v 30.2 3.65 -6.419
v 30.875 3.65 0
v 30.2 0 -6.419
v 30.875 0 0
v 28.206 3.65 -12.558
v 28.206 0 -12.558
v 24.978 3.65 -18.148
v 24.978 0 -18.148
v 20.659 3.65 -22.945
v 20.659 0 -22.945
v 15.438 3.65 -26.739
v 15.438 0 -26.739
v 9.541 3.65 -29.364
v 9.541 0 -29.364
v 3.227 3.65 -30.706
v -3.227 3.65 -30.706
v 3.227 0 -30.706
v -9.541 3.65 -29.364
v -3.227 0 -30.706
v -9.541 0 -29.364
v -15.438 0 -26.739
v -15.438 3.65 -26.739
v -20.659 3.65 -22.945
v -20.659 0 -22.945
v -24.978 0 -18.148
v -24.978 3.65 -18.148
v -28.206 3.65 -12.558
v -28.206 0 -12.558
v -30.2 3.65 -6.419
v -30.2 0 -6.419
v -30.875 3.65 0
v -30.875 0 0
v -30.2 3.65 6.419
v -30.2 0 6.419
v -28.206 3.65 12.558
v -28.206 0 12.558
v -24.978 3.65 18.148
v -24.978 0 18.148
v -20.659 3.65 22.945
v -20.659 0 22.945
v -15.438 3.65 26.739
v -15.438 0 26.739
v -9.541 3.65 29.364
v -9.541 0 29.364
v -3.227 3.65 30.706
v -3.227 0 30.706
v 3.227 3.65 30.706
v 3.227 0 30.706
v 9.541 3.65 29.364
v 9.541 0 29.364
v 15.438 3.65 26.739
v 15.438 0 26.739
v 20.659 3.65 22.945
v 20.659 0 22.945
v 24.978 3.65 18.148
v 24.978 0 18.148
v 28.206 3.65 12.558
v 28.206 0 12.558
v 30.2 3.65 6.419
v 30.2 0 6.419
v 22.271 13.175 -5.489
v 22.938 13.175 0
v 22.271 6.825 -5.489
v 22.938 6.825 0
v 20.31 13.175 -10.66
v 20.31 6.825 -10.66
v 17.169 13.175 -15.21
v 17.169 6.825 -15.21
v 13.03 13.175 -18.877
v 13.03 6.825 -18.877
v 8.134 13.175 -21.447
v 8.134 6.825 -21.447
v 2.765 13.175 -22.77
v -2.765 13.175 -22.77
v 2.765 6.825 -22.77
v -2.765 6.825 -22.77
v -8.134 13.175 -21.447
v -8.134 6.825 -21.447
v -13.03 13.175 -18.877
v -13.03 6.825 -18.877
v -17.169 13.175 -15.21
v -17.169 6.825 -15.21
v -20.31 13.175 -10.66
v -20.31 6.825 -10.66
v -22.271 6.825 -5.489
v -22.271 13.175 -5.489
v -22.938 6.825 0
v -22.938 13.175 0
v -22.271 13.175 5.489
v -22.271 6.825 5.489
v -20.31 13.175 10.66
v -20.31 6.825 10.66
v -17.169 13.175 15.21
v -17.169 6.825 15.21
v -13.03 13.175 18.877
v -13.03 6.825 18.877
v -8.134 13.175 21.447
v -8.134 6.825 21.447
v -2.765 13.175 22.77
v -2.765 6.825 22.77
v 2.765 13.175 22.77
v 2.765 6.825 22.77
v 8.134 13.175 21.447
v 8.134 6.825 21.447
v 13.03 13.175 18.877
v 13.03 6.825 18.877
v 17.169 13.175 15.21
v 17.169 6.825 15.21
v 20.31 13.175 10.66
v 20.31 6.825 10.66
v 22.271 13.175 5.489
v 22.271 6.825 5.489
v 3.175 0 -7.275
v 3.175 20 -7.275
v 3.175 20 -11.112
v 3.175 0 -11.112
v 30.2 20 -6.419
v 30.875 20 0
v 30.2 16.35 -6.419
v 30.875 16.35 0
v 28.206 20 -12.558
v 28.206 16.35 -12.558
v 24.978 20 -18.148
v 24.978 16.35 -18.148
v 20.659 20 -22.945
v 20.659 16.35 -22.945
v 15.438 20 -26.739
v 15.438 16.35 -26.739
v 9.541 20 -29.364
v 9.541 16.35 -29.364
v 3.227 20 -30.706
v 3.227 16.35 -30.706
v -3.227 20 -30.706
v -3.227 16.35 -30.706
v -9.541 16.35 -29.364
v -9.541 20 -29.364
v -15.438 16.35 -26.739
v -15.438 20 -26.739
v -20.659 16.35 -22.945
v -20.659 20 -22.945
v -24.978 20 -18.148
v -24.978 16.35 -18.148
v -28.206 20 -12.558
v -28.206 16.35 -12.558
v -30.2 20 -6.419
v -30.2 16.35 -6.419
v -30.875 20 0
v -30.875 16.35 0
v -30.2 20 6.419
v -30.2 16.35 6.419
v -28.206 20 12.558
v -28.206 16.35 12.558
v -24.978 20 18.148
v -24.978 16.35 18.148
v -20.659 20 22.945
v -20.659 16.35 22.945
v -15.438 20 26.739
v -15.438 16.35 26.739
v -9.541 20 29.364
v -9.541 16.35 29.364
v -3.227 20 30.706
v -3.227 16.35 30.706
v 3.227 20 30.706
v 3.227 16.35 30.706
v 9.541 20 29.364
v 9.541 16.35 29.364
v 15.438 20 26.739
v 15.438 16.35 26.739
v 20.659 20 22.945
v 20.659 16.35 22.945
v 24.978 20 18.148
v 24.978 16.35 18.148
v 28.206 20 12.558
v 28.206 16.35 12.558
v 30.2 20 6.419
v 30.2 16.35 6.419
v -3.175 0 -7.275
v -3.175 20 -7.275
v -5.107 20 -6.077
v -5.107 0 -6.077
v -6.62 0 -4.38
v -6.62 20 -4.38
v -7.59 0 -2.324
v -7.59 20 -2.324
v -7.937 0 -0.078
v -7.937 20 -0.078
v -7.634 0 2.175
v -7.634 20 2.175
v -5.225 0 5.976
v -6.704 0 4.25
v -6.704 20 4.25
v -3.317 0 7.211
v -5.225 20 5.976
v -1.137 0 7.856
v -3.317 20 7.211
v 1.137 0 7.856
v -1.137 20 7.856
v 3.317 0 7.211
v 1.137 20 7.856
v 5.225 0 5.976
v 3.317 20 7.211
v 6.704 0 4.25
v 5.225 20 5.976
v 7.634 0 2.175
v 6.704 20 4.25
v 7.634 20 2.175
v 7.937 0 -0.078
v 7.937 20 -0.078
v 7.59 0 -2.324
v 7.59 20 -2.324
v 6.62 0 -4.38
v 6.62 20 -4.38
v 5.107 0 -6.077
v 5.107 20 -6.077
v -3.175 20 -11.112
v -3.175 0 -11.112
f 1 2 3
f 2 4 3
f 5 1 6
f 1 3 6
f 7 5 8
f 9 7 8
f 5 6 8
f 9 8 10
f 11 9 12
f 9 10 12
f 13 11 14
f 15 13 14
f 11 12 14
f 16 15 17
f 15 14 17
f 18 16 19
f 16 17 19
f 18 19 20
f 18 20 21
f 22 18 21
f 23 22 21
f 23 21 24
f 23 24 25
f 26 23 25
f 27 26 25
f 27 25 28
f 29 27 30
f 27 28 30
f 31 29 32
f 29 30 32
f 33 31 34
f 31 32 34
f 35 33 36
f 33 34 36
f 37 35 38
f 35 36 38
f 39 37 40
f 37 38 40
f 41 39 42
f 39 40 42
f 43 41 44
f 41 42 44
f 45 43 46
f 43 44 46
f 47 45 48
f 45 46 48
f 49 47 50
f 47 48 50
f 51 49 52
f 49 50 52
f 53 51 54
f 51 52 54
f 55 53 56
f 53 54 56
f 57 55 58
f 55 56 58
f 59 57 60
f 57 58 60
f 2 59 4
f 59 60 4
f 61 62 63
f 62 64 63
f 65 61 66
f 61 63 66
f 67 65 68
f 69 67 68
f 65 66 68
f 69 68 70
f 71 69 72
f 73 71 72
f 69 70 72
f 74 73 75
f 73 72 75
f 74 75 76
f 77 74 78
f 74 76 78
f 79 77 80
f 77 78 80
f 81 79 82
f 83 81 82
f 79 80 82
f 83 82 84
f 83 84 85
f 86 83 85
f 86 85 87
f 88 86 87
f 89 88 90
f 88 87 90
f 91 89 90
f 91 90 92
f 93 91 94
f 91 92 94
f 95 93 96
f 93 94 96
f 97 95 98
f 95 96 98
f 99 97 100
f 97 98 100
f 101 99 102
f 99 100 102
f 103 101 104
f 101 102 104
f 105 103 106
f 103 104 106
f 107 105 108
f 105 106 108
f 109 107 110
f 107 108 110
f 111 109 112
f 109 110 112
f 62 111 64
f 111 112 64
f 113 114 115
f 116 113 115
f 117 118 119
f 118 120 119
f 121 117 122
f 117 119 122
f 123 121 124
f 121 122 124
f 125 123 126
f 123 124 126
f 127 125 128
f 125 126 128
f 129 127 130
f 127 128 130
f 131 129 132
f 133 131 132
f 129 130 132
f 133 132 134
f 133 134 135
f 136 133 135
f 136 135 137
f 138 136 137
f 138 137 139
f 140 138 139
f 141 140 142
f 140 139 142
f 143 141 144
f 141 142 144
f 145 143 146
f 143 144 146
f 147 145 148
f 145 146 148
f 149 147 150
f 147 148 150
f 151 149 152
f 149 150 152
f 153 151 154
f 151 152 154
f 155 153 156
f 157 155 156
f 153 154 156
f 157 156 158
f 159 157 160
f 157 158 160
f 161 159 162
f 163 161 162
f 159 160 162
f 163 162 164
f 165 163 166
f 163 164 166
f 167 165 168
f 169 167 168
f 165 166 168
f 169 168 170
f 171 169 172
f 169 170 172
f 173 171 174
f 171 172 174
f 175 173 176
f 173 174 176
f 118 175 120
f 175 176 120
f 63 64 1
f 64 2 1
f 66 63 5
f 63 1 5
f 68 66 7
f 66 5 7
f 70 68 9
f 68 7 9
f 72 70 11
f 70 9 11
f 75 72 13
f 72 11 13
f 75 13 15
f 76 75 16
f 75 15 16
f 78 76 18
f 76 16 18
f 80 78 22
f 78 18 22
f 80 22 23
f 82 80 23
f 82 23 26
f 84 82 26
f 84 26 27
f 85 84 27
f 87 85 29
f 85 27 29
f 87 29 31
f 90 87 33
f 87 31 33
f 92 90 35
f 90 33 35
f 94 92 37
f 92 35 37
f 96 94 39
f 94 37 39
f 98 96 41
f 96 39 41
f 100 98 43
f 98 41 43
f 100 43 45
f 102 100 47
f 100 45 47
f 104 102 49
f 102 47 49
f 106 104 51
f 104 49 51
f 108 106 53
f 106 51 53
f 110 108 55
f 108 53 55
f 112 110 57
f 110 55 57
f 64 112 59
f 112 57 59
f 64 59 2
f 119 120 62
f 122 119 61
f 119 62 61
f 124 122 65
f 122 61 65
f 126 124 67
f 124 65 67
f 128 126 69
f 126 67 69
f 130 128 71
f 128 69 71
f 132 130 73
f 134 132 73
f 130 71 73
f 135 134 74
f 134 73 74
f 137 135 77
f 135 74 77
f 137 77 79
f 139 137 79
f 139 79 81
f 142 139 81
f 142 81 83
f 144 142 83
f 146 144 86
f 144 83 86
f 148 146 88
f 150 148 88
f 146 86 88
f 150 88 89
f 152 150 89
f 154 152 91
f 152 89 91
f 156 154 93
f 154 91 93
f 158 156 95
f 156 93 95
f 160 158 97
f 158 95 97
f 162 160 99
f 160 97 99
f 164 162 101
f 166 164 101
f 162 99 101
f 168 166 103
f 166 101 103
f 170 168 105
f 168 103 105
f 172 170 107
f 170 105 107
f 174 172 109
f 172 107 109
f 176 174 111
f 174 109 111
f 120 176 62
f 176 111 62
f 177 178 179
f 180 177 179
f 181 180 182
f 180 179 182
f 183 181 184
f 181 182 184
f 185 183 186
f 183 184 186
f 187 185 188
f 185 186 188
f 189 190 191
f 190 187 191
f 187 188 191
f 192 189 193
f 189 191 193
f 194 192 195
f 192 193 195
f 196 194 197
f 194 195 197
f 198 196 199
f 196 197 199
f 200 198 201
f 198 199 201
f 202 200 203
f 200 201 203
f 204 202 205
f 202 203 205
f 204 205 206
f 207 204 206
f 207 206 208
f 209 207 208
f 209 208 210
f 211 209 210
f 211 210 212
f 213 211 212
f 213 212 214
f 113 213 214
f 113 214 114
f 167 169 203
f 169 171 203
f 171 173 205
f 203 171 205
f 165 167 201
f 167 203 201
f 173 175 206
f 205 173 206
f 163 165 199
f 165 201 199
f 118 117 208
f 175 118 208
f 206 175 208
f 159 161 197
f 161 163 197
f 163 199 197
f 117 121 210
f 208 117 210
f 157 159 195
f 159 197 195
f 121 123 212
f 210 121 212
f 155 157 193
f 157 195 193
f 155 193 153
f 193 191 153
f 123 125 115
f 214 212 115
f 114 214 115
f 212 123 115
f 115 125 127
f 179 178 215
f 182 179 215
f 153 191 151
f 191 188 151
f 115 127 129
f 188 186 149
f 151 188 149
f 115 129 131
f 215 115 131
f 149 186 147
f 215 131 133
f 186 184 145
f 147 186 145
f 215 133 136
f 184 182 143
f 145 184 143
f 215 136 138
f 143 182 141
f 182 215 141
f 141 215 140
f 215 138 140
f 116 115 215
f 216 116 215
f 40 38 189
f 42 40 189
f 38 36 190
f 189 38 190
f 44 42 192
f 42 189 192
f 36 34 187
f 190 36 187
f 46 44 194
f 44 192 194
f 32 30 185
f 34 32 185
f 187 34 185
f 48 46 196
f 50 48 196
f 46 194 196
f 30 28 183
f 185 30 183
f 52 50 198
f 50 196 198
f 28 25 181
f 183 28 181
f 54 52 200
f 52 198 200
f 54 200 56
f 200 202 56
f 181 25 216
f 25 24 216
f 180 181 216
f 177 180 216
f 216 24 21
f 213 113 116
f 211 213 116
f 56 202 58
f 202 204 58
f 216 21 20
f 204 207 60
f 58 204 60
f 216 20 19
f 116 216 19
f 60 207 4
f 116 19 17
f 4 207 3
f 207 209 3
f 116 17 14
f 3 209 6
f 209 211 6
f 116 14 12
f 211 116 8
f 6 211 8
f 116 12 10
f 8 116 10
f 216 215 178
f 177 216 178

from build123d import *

# Parameters (mm, degrees)
CORTAR_EXTRUIR1_DEPTH = 21


with BuildPart() as part:
    # Croquis1 → Revolución2 (revolve)
    with BuildSketch(Plane.XY):
        Polygon((7.9375, 0), (7.9375, 20), (30.875, 20), (30.875, 16.35), (22.9375, 13.175), (22.9375, 6.825), (30.875, 3.65), (30.875, 0), align=None)
    revolve(axis=Axis((0, 0, 0), (0, 1, 0)))

    # Croquis2 → Cortar-Extruir1 (cut, through all)
    with BuildSketch(Plane(origin=(0, 20, 0), x_dir=(1, 0, 0), z_dir=(0, 1, 0))):
        with BuildLine():
            Line((-3.175, 11.1125), (-3.175, 7.274838916))
            ThreePointArc((-3.175, 7.274838916), (0, 7.9375), (3.175, 7.274838916))
            Line((3.175, 7.274838916), (3.175, 11.1125))
            Line((3.175, 11.1125), (-3.175, 11.1125))
        make_face()
    extrude(amount=-CORTAR_EXTRUIR1_DEPTH, mode=Mode.SUBTRACT)


solid = part.part
